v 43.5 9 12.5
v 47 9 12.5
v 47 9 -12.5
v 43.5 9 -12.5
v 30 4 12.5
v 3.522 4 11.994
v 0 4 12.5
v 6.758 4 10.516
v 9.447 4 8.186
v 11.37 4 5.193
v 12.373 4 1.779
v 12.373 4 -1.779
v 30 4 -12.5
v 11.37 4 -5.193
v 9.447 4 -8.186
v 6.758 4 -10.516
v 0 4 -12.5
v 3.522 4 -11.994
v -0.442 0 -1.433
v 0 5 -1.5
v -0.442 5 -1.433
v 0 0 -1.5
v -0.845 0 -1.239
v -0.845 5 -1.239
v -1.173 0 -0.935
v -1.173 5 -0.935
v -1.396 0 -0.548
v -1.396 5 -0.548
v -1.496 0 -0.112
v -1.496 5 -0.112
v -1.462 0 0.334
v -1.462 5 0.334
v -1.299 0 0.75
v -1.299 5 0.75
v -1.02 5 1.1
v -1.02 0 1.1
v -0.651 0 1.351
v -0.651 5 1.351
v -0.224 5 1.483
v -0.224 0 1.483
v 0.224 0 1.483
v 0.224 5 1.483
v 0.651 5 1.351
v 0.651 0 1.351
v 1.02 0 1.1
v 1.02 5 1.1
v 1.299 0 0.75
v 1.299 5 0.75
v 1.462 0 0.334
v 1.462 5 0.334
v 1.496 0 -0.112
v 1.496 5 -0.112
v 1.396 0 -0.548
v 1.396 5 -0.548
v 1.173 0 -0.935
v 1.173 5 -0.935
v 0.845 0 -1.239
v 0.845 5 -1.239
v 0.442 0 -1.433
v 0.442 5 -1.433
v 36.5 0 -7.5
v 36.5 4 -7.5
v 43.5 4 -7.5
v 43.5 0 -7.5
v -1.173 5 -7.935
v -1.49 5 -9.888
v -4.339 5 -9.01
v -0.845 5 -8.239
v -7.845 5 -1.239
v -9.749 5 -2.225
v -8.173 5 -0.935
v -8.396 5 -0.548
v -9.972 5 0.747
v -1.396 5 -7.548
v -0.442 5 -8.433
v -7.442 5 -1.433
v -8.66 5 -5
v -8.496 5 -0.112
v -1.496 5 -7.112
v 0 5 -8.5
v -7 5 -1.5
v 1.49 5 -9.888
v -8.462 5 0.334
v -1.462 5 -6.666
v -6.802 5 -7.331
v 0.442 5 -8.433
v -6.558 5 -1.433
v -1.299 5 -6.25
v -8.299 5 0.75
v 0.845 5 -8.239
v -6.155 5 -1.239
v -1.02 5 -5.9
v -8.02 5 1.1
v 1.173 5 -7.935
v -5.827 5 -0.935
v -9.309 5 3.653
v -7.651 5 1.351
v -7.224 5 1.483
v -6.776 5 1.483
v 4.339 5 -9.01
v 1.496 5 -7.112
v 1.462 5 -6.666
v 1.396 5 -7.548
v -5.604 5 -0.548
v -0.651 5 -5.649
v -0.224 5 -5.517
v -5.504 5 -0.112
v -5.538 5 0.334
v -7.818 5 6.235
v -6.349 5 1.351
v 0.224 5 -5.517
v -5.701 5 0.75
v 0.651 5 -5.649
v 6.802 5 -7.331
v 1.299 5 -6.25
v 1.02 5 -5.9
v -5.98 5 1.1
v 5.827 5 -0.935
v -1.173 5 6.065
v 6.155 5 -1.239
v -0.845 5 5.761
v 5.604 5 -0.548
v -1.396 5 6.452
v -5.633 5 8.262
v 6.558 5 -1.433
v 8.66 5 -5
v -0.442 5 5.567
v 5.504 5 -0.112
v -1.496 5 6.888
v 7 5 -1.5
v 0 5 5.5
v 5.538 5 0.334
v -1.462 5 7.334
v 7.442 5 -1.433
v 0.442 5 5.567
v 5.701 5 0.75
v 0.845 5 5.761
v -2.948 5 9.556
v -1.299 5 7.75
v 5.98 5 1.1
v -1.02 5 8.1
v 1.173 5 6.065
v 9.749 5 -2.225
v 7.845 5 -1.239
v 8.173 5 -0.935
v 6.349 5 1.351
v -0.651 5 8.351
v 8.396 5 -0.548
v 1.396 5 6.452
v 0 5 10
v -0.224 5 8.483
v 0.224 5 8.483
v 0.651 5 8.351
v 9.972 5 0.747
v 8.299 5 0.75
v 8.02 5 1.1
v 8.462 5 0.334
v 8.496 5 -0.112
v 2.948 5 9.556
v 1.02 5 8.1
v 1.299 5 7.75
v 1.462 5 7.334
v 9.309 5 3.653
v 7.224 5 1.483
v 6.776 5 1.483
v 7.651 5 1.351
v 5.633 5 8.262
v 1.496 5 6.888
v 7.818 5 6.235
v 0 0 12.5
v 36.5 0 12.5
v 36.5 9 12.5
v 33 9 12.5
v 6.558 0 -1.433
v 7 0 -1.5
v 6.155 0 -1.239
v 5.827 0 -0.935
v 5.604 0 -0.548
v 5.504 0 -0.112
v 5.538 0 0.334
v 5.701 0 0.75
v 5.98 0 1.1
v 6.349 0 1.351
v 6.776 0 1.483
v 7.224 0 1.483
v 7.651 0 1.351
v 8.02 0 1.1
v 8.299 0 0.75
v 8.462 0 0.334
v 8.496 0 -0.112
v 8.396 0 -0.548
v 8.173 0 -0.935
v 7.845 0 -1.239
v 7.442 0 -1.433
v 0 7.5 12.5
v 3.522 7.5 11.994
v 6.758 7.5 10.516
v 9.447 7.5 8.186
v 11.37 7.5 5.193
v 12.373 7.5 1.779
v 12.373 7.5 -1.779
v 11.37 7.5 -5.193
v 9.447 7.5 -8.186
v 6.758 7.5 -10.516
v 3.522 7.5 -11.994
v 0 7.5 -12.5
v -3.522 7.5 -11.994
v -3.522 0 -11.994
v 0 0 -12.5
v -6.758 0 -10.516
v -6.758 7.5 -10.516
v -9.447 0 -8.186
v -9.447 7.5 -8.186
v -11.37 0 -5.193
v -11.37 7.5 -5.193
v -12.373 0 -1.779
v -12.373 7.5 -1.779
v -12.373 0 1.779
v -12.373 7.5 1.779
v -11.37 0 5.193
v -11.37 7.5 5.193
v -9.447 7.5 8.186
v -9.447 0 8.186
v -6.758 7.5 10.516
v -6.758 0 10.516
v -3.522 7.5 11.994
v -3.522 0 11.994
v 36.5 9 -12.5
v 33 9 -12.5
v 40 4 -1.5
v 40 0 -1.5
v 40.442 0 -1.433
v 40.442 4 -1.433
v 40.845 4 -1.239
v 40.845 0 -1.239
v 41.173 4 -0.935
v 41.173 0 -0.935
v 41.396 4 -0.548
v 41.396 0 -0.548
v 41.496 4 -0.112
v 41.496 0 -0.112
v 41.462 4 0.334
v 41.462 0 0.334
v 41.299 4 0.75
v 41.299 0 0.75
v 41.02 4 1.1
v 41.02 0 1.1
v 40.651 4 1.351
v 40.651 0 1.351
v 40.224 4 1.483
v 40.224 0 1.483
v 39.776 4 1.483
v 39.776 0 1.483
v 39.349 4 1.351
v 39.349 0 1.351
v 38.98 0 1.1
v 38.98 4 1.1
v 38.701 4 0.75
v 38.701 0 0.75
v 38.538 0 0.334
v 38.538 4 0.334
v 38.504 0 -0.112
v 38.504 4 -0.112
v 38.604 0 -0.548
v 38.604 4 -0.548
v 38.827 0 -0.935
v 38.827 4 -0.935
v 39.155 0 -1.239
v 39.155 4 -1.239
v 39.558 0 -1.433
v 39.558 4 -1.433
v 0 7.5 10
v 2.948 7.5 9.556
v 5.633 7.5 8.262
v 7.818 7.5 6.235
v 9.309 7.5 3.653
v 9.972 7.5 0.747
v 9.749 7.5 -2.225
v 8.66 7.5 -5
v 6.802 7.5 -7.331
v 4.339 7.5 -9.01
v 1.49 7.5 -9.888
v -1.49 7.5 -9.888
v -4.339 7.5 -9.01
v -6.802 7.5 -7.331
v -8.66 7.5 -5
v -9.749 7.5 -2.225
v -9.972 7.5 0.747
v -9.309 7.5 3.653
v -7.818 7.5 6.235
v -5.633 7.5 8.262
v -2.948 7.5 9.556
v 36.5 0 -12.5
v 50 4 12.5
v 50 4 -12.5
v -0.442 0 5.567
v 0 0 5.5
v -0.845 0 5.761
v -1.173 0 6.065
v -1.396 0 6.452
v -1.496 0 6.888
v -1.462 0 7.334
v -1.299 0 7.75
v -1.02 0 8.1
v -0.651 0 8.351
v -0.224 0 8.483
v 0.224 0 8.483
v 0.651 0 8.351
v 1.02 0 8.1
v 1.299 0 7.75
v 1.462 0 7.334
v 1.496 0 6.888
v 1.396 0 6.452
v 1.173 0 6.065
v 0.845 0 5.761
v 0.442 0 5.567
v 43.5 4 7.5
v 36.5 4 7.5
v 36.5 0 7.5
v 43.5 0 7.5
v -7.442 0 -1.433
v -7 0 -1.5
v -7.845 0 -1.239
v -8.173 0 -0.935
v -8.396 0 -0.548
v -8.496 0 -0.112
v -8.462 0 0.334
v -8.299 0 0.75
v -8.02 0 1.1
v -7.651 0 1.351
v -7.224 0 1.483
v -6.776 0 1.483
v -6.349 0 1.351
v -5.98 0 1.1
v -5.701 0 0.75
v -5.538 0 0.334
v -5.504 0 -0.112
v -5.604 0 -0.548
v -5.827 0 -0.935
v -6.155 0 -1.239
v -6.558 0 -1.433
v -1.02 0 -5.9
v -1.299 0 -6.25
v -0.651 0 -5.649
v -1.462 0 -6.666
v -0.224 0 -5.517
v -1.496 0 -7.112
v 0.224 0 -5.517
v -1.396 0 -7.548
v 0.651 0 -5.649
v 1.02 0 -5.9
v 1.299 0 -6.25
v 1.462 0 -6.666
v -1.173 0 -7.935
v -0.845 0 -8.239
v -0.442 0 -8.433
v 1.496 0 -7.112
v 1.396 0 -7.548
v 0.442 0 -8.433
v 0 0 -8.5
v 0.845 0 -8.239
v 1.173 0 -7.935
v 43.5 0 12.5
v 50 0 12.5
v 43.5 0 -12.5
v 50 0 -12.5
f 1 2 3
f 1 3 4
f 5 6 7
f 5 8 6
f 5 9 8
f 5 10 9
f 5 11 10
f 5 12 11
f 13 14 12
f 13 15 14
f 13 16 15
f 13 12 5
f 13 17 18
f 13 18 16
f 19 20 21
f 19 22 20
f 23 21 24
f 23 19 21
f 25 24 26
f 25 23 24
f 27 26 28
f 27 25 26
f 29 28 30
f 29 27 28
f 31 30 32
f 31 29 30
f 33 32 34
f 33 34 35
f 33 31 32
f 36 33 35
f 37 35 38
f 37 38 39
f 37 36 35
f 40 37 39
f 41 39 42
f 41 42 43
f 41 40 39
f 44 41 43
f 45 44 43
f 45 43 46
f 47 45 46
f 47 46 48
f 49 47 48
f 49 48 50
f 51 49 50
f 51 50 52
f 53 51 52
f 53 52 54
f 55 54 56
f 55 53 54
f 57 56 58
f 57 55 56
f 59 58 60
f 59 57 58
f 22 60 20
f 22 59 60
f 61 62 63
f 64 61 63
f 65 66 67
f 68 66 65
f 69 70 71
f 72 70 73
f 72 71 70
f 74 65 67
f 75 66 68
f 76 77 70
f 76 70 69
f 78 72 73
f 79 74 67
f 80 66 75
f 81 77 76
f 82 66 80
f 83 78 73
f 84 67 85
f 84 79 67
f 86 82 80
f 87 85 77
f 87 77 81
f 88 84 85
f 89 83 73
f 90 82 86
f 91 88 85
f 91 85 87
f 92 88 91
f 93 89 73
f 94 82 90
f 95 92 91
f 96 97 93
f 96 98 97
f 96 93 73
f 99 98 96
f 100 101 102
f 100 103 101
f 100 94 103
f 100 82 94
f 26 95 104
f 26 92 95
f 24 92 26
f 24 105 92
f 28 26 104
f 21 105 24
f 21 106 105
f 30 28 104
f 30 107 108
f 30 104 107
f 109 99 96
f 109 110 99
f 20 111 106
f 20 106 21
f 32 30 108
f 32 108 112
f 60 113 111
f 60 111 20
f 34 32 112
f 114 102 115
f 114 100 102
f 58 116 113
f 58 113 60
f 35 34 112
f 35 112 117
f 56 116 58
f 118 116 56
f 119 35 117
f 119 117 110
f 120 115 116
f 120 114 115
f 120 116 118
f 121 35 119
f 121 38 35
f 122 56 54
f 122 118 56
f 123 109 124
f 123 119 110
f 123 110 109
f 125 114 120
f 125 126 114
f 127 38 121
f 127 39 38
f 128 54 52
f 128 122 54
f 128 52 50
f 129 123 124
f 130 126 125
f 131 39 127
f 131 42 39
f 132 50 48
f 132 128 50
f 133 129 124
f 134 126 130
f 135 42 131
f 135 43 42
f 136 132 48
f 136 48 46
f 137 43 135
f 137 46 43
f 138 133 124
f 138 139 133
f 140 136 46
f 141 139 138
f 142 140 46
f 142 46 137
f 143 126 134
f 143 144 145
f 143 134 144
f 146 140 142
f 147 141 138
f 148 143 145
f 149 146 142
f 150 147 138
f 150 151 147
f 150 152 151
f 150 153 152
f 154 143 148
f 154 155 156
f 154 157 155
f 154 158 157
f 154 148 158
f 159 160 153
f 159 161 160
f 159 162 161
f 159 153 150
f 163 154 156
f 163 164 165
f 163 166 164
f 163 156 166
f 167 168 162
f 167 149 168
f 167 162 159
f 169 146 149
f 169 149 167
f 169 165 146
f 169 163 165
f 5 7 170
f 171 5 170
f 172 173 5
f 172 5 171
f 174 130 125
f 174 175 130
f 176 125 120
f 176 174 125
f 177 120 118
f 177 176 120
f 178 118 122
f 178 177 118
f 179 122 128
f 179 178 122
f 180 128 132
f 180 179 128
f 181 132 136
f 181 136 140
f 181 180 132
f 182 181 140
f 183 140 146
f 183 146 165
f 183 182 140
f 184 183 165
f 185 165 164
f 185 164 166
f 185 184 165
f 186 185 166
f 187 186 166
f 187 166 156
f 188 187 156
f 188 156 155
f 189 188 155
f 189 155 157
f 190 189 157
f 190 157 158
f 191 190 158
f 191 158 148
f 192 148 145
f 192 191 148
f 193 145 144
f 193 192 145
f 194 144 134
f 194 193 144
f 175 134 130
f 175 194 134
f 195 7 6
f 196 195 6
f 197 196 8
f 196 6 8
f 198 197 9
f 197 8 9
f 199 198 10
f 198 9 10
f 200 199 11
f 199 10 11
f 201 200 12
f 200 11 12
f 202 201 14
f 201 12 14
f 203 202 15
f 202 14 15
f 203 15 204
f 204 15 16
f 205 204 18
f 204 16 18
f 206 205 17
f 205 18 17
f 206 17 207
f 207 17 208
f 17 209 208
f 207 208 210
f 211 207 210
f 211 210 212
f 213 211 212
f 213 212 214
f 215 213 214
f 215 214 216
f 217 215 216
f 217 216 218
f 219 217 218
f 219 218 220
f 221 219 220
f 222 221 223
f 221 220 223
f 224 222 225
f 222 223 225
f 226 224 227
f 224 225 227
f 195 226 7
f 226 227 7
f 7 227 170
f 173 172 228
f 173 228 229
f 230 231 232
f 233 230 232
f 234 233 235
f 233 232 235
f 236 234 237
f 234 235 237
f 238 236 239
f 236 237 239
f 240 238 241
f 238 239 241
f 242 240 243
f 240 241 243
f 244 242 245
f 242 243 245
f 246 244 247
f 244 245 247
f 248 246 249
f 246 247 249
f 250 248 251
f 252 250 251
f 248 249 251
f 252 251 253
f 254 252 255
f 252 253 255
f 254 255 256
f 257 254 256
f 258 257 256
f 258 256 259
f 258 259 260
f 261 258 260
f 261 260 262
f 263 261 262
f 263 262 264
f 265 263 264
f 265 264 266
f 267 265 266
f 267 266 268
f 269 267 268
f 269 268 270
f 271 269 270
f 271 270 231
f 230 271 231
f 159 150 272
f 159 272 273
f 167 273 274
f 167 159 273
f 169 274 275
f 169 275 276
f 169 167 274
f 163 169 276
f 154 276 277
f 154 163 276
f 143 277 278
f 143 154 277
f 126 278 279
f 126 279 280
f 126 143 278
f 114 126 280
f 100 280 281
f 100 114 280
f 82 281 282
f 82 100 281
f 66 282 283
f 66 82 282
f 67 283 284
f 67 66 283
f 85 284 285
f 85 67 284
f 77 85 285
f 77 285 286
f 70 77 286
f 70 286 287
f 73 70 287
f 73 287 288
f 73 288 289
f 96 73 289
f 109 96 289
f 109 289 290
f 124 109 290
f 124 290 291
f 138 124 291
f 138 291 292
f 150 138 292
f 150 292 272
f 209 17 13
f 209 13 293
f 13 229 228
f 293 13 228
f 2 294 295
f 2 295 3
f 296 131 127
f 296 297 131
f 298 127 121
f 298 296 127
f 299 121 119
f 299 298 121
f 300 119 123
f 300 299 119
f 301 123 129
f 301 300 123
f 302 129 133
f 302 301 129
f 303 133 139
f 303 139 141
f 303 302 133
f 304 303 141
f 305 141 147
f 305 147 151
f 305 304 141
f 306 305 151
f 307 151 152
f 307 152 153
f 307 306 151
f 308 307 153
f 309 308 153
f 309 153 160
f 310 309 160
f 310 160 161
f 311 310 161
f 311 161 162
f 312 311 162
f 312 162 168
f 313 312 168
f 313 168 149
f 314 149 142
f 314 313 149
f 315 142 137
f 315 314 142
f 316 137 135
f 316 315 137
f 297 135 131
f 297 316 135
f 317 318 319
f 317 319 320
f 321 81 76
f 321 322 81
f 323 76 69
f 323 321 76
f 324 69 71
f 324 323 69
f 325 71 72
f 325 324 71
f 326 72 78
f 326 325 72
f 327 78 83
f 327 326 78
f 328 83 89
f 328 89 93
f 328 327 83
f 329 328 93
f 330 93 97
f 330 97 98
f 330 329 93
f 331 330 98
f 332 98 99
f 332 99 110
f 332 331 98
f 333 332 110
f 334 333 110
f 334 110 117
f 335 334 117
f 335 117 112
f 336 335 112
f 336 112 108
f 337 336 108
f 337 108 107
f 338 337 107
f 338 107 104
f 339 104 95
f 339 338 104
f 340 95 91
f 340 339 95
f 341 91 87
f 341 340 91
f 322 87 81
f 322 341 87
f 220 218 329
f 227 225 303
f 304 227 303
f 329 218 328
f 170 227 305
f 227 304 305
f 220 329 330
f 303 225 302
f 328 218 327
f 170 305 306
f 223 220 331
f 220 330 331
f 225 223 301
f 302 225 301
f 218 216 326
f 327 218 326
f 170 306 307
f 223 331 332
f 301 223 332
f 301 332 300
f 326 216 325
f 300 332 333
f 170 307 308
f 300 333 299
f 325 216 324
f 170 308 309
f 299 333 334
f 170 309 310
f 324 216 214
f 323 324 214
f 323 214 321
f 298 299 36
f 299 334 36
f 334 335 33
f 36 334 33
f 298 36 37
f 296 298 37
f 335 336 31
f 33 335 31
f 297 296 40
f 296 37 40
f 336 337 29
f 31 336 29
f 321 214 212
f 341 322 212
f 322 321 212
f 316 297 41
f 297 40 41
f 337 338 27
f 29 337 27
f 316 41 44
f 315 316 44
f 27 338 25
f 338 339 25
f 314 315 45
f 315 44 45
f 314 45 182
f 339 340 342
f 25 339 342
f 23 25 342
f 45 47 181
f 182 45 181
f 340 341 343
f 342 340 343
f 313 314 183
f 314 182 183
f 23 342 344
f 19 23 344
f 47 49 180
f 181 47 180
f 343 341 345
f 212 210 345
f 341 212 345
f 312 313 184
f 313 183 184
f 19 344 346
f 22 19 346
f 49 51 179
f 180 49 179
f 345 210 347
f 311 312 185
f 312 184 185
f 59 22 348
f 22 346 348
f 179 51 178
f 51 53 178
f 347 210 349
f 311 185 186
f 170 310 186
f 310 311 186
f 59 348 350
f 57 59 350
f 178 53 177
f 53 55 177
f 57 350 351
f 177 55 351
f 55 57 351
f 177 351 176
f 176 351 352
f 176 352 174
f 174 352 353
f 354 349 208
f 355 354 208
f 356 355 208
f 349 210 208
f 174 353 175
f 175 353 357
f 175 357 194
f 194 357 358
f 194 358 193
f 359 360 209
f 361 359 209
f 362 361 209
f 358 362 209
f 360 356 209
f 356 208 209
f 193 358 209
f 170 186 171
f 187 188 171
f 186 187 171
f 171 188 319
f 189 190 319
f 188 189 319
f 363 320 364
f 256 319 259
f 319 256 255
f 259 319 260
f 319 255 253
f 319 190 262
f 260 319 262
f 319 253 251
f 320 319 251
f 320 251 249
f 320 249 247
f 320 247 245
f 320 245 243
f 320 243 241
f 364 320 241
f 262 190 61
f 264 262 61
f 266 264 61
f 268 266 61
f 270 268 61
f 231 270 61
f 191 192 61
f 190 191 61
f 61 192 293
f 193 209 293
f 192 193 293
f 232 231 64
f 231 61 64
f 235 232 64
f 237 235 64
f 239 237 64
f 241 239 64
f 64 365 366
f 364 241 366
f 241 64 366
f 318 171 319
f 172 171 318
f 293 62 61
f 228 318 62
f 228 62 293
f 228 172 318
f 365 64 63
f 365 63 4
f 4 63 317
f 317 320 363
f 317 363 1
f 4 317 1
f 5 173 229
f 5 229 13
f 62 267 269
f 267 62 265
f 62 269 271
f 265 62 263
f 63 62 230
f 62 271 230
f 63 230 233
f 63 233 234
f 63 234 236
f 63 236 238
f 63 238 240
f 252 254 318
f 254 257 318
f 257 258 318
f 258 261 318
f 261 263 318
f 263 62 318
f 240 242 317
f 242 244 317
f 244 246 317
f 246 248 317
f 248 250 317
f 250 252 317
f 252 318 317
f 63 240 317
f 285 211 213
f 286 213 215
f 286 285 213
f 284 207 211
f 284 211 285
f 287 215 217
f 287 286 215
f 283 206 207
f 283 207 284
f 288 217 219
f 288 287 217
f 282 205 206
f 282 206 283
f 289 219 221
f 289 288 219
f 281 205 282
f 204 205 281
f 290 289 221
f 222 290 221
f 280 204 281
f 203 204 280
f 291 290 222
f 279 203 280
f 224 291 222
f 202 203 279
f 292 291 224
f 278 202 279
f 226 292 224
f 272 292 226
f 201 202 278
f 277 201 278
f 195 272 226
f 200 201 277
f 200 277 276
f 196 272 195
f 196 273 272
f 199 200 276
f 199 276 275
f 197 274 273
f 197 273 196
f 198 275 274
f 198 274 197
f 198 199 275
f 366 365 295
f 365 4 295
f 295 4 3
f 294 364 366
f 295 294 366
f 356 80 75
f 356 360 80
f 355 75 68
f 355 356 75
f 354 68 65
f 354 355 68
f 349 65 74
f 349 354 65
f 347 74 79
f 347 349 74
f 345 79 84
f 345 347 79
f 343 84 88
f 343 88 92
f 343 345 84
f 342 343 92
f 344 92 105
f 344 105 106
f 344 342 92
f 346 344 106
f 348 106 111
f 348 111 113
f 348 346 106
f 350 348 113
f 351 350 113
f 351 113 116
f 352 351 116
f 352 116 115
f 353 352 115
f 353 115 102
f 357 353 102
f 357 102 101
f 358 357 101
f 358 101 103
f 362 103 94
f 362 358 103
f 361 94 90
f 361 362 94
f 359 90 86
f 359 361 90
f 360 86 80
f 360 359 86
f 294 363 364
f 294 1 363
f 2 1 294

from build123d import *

# Parameters (mm, degrees)
SKETCH_1_R          = 12.5
EXTRUDE_1_DEPTH     = 4
SKETCH_2_R          = 12.5
SKETCH_2_R_2        = 10
EXTRUDE_2_DEPTH     = 3.5
SKETCH_3_R          = 1.5
CUT_EXTRUDE_1_DEPTH = 53.08166664
EXTRUDE_3_DEPTH     = 25
SKETCH_5_W          = 7
SKETCH_5_H          = 5
CUT_EXTRUDE_2_DEPTH = 57.621550668
SKETCH_6_W          = 7
SKETCH_6_H          = 5
CUT_EXTRUDE_3_DEPTH = 52.780787943
SKETCH_7_R          = 10
SKETCH_7_R_2        = 1.5
EXTRUDE_4_DEPTH     = 1


with BuildPart() as part:
    # 草图1 → 凸台-拉伸1 (new body)
    with BuildSketch(Plane(origin=(0, 0, 0), x_dir=(1, 0, 0), z_dir=(0, 1, 0))):
        Circle(SKETCH_1_R)
        with BuildLine():
            Line((50, 12.5), (0, 12.5))
            ThreePointArc((0, 12.5), (8.838834765, 8.838834765), (12.5, 0))
            ThreePointArc((12.5, 0), (8.838834765, -8.838834765), (0, -12.5))
            Line((0, -12.5), (50, -12.5))
            Line((50, -12.5), (50, 12.5))
        make_face()
    extrude(amount=EXTRUDE_1_DEPTH)

    # 草图2 → 凸台-拉伸2 (add)
    with BuildSketch(Plane(origin=(0, 4, 0), x_dir=(1, 0, 0), z_dir=(0, 1, 0))):
        with Locations(Location((0, 0, 0), (0, 0, 270))):
            Circle(SKETCH_2_R)
        with Locations(Location((0, 0, 0), (0, 0, 270))):
            Circle(SKETCH_2_R_2, mode=Mode.SUBTRACT)
    extrude(amount=EXTRUDE_2_DEPTH)

    # 草图3 → 切除-拉伸1 (cut, through all)
    with BuildSketch(Plane.XZ):
        with Locations(Location((0, 0, 0), (0, 0, 270))):
            Circle(SKETCH_3_R)
        with Locations(Location((0, 7, 0), (0, 0, 270))):
            Circle(SKETCH_3_R)
        with Locations(Location((7, 0, 0), (0, 0, 270))):
            Circle(SKETCH_3_R)
        with Locations(Location((0, -7, 0), (0, 0, 270))):
            Circle(SKETCH_3_R)
        with Locations(Location((-7, 0, 0), (0, 0, 270))):
            Circle(SKETCH_3_R)
        with Locations(Location((40, 0, 0), (0, 0, 270))):
            Circle(SKETCH_3_R)
    extrude(amount=-CUT_EXTRUDE_1_DEPTH, mode=Mode.SUBTRACT)

    # 草图4 → 凸台-拉伸3 (add)
    with BuildSketch(Plane.XY.offset(12.5)):
        Polygon((50, 4), (47, 9), (33, 9), (30, 4), align=None)
    extrude(amount=-EXTRUDE_3_DEPTH)

    # 草图5 → 切除-拉伸2 (cut, through all)
    with BuildSketch(Plane.XY.offset(12.5)):
        with Locations((40, 6.5)):
            Rectangle(SKETCH_5_W, SKETCH_5_H)
    extrude(amount=-CUT_EXTRUDE_2_DEPTH, mode=Mode.SUBTRACT)

    # 草图6 → 切除-拉伸3 (cut, through all)
    with BuildSketch(Plane(origin=(0, 4, 0), x_dir=(1, 0, 0), z_dir=(0, 1, 0))):
        with Locations((40, -10)):
            Rectangle(SKETCH_6_W, SKETCH_6_H)
        with Locations((40, 10)):
            Rectangle(SKETCH_6_W, SKETCH_6_H)
    extrude(amount=-CUT_EXTRUDE_3_DEPTH, mode=Mode.SUBTRACT)

    # 草图7 → 凸台-拉伸4 (add)
    with BuildSketch(Plane(origin=(0, 4, 0), x_dir=(1, 0, 0), z_dir=(0, 1, 0))):
        with Locations(Location((0, 0, 0), (0, 0, 270))):
            Circle(SKETCH_7_R)
        with Locations(Location((0, 0, 0), (0, 0, 90))):
            Circle(SKETCH_7_R_2, mode=Mode.SUBTRACT)
        with Locations(Location((0, 7, 0), (0, 0, 90))):
            Circle(SKETCH_7_R_2, mode=Mode.SUBTRACT)
        with Locations(Location((7, 0, 0), (0, 0, 90))):
            Circle(SKETCH_7_R_2, mode=Mode.SUBTRACT)
        with Locations(Location((0, -7, 0), (0, 0, 90))):
            Circle(SKETCH_7_R_2, mode=Mode.SUBTRACT)
        with Locations(Location((-7, 0, 0), (0, 0, 90))):
            Circle(SKETCH_7_R_2, mode=Mode.SUBTRACT)
    extrude(amount=EXTRUDE_4_DEPTH)


solid = part.part
